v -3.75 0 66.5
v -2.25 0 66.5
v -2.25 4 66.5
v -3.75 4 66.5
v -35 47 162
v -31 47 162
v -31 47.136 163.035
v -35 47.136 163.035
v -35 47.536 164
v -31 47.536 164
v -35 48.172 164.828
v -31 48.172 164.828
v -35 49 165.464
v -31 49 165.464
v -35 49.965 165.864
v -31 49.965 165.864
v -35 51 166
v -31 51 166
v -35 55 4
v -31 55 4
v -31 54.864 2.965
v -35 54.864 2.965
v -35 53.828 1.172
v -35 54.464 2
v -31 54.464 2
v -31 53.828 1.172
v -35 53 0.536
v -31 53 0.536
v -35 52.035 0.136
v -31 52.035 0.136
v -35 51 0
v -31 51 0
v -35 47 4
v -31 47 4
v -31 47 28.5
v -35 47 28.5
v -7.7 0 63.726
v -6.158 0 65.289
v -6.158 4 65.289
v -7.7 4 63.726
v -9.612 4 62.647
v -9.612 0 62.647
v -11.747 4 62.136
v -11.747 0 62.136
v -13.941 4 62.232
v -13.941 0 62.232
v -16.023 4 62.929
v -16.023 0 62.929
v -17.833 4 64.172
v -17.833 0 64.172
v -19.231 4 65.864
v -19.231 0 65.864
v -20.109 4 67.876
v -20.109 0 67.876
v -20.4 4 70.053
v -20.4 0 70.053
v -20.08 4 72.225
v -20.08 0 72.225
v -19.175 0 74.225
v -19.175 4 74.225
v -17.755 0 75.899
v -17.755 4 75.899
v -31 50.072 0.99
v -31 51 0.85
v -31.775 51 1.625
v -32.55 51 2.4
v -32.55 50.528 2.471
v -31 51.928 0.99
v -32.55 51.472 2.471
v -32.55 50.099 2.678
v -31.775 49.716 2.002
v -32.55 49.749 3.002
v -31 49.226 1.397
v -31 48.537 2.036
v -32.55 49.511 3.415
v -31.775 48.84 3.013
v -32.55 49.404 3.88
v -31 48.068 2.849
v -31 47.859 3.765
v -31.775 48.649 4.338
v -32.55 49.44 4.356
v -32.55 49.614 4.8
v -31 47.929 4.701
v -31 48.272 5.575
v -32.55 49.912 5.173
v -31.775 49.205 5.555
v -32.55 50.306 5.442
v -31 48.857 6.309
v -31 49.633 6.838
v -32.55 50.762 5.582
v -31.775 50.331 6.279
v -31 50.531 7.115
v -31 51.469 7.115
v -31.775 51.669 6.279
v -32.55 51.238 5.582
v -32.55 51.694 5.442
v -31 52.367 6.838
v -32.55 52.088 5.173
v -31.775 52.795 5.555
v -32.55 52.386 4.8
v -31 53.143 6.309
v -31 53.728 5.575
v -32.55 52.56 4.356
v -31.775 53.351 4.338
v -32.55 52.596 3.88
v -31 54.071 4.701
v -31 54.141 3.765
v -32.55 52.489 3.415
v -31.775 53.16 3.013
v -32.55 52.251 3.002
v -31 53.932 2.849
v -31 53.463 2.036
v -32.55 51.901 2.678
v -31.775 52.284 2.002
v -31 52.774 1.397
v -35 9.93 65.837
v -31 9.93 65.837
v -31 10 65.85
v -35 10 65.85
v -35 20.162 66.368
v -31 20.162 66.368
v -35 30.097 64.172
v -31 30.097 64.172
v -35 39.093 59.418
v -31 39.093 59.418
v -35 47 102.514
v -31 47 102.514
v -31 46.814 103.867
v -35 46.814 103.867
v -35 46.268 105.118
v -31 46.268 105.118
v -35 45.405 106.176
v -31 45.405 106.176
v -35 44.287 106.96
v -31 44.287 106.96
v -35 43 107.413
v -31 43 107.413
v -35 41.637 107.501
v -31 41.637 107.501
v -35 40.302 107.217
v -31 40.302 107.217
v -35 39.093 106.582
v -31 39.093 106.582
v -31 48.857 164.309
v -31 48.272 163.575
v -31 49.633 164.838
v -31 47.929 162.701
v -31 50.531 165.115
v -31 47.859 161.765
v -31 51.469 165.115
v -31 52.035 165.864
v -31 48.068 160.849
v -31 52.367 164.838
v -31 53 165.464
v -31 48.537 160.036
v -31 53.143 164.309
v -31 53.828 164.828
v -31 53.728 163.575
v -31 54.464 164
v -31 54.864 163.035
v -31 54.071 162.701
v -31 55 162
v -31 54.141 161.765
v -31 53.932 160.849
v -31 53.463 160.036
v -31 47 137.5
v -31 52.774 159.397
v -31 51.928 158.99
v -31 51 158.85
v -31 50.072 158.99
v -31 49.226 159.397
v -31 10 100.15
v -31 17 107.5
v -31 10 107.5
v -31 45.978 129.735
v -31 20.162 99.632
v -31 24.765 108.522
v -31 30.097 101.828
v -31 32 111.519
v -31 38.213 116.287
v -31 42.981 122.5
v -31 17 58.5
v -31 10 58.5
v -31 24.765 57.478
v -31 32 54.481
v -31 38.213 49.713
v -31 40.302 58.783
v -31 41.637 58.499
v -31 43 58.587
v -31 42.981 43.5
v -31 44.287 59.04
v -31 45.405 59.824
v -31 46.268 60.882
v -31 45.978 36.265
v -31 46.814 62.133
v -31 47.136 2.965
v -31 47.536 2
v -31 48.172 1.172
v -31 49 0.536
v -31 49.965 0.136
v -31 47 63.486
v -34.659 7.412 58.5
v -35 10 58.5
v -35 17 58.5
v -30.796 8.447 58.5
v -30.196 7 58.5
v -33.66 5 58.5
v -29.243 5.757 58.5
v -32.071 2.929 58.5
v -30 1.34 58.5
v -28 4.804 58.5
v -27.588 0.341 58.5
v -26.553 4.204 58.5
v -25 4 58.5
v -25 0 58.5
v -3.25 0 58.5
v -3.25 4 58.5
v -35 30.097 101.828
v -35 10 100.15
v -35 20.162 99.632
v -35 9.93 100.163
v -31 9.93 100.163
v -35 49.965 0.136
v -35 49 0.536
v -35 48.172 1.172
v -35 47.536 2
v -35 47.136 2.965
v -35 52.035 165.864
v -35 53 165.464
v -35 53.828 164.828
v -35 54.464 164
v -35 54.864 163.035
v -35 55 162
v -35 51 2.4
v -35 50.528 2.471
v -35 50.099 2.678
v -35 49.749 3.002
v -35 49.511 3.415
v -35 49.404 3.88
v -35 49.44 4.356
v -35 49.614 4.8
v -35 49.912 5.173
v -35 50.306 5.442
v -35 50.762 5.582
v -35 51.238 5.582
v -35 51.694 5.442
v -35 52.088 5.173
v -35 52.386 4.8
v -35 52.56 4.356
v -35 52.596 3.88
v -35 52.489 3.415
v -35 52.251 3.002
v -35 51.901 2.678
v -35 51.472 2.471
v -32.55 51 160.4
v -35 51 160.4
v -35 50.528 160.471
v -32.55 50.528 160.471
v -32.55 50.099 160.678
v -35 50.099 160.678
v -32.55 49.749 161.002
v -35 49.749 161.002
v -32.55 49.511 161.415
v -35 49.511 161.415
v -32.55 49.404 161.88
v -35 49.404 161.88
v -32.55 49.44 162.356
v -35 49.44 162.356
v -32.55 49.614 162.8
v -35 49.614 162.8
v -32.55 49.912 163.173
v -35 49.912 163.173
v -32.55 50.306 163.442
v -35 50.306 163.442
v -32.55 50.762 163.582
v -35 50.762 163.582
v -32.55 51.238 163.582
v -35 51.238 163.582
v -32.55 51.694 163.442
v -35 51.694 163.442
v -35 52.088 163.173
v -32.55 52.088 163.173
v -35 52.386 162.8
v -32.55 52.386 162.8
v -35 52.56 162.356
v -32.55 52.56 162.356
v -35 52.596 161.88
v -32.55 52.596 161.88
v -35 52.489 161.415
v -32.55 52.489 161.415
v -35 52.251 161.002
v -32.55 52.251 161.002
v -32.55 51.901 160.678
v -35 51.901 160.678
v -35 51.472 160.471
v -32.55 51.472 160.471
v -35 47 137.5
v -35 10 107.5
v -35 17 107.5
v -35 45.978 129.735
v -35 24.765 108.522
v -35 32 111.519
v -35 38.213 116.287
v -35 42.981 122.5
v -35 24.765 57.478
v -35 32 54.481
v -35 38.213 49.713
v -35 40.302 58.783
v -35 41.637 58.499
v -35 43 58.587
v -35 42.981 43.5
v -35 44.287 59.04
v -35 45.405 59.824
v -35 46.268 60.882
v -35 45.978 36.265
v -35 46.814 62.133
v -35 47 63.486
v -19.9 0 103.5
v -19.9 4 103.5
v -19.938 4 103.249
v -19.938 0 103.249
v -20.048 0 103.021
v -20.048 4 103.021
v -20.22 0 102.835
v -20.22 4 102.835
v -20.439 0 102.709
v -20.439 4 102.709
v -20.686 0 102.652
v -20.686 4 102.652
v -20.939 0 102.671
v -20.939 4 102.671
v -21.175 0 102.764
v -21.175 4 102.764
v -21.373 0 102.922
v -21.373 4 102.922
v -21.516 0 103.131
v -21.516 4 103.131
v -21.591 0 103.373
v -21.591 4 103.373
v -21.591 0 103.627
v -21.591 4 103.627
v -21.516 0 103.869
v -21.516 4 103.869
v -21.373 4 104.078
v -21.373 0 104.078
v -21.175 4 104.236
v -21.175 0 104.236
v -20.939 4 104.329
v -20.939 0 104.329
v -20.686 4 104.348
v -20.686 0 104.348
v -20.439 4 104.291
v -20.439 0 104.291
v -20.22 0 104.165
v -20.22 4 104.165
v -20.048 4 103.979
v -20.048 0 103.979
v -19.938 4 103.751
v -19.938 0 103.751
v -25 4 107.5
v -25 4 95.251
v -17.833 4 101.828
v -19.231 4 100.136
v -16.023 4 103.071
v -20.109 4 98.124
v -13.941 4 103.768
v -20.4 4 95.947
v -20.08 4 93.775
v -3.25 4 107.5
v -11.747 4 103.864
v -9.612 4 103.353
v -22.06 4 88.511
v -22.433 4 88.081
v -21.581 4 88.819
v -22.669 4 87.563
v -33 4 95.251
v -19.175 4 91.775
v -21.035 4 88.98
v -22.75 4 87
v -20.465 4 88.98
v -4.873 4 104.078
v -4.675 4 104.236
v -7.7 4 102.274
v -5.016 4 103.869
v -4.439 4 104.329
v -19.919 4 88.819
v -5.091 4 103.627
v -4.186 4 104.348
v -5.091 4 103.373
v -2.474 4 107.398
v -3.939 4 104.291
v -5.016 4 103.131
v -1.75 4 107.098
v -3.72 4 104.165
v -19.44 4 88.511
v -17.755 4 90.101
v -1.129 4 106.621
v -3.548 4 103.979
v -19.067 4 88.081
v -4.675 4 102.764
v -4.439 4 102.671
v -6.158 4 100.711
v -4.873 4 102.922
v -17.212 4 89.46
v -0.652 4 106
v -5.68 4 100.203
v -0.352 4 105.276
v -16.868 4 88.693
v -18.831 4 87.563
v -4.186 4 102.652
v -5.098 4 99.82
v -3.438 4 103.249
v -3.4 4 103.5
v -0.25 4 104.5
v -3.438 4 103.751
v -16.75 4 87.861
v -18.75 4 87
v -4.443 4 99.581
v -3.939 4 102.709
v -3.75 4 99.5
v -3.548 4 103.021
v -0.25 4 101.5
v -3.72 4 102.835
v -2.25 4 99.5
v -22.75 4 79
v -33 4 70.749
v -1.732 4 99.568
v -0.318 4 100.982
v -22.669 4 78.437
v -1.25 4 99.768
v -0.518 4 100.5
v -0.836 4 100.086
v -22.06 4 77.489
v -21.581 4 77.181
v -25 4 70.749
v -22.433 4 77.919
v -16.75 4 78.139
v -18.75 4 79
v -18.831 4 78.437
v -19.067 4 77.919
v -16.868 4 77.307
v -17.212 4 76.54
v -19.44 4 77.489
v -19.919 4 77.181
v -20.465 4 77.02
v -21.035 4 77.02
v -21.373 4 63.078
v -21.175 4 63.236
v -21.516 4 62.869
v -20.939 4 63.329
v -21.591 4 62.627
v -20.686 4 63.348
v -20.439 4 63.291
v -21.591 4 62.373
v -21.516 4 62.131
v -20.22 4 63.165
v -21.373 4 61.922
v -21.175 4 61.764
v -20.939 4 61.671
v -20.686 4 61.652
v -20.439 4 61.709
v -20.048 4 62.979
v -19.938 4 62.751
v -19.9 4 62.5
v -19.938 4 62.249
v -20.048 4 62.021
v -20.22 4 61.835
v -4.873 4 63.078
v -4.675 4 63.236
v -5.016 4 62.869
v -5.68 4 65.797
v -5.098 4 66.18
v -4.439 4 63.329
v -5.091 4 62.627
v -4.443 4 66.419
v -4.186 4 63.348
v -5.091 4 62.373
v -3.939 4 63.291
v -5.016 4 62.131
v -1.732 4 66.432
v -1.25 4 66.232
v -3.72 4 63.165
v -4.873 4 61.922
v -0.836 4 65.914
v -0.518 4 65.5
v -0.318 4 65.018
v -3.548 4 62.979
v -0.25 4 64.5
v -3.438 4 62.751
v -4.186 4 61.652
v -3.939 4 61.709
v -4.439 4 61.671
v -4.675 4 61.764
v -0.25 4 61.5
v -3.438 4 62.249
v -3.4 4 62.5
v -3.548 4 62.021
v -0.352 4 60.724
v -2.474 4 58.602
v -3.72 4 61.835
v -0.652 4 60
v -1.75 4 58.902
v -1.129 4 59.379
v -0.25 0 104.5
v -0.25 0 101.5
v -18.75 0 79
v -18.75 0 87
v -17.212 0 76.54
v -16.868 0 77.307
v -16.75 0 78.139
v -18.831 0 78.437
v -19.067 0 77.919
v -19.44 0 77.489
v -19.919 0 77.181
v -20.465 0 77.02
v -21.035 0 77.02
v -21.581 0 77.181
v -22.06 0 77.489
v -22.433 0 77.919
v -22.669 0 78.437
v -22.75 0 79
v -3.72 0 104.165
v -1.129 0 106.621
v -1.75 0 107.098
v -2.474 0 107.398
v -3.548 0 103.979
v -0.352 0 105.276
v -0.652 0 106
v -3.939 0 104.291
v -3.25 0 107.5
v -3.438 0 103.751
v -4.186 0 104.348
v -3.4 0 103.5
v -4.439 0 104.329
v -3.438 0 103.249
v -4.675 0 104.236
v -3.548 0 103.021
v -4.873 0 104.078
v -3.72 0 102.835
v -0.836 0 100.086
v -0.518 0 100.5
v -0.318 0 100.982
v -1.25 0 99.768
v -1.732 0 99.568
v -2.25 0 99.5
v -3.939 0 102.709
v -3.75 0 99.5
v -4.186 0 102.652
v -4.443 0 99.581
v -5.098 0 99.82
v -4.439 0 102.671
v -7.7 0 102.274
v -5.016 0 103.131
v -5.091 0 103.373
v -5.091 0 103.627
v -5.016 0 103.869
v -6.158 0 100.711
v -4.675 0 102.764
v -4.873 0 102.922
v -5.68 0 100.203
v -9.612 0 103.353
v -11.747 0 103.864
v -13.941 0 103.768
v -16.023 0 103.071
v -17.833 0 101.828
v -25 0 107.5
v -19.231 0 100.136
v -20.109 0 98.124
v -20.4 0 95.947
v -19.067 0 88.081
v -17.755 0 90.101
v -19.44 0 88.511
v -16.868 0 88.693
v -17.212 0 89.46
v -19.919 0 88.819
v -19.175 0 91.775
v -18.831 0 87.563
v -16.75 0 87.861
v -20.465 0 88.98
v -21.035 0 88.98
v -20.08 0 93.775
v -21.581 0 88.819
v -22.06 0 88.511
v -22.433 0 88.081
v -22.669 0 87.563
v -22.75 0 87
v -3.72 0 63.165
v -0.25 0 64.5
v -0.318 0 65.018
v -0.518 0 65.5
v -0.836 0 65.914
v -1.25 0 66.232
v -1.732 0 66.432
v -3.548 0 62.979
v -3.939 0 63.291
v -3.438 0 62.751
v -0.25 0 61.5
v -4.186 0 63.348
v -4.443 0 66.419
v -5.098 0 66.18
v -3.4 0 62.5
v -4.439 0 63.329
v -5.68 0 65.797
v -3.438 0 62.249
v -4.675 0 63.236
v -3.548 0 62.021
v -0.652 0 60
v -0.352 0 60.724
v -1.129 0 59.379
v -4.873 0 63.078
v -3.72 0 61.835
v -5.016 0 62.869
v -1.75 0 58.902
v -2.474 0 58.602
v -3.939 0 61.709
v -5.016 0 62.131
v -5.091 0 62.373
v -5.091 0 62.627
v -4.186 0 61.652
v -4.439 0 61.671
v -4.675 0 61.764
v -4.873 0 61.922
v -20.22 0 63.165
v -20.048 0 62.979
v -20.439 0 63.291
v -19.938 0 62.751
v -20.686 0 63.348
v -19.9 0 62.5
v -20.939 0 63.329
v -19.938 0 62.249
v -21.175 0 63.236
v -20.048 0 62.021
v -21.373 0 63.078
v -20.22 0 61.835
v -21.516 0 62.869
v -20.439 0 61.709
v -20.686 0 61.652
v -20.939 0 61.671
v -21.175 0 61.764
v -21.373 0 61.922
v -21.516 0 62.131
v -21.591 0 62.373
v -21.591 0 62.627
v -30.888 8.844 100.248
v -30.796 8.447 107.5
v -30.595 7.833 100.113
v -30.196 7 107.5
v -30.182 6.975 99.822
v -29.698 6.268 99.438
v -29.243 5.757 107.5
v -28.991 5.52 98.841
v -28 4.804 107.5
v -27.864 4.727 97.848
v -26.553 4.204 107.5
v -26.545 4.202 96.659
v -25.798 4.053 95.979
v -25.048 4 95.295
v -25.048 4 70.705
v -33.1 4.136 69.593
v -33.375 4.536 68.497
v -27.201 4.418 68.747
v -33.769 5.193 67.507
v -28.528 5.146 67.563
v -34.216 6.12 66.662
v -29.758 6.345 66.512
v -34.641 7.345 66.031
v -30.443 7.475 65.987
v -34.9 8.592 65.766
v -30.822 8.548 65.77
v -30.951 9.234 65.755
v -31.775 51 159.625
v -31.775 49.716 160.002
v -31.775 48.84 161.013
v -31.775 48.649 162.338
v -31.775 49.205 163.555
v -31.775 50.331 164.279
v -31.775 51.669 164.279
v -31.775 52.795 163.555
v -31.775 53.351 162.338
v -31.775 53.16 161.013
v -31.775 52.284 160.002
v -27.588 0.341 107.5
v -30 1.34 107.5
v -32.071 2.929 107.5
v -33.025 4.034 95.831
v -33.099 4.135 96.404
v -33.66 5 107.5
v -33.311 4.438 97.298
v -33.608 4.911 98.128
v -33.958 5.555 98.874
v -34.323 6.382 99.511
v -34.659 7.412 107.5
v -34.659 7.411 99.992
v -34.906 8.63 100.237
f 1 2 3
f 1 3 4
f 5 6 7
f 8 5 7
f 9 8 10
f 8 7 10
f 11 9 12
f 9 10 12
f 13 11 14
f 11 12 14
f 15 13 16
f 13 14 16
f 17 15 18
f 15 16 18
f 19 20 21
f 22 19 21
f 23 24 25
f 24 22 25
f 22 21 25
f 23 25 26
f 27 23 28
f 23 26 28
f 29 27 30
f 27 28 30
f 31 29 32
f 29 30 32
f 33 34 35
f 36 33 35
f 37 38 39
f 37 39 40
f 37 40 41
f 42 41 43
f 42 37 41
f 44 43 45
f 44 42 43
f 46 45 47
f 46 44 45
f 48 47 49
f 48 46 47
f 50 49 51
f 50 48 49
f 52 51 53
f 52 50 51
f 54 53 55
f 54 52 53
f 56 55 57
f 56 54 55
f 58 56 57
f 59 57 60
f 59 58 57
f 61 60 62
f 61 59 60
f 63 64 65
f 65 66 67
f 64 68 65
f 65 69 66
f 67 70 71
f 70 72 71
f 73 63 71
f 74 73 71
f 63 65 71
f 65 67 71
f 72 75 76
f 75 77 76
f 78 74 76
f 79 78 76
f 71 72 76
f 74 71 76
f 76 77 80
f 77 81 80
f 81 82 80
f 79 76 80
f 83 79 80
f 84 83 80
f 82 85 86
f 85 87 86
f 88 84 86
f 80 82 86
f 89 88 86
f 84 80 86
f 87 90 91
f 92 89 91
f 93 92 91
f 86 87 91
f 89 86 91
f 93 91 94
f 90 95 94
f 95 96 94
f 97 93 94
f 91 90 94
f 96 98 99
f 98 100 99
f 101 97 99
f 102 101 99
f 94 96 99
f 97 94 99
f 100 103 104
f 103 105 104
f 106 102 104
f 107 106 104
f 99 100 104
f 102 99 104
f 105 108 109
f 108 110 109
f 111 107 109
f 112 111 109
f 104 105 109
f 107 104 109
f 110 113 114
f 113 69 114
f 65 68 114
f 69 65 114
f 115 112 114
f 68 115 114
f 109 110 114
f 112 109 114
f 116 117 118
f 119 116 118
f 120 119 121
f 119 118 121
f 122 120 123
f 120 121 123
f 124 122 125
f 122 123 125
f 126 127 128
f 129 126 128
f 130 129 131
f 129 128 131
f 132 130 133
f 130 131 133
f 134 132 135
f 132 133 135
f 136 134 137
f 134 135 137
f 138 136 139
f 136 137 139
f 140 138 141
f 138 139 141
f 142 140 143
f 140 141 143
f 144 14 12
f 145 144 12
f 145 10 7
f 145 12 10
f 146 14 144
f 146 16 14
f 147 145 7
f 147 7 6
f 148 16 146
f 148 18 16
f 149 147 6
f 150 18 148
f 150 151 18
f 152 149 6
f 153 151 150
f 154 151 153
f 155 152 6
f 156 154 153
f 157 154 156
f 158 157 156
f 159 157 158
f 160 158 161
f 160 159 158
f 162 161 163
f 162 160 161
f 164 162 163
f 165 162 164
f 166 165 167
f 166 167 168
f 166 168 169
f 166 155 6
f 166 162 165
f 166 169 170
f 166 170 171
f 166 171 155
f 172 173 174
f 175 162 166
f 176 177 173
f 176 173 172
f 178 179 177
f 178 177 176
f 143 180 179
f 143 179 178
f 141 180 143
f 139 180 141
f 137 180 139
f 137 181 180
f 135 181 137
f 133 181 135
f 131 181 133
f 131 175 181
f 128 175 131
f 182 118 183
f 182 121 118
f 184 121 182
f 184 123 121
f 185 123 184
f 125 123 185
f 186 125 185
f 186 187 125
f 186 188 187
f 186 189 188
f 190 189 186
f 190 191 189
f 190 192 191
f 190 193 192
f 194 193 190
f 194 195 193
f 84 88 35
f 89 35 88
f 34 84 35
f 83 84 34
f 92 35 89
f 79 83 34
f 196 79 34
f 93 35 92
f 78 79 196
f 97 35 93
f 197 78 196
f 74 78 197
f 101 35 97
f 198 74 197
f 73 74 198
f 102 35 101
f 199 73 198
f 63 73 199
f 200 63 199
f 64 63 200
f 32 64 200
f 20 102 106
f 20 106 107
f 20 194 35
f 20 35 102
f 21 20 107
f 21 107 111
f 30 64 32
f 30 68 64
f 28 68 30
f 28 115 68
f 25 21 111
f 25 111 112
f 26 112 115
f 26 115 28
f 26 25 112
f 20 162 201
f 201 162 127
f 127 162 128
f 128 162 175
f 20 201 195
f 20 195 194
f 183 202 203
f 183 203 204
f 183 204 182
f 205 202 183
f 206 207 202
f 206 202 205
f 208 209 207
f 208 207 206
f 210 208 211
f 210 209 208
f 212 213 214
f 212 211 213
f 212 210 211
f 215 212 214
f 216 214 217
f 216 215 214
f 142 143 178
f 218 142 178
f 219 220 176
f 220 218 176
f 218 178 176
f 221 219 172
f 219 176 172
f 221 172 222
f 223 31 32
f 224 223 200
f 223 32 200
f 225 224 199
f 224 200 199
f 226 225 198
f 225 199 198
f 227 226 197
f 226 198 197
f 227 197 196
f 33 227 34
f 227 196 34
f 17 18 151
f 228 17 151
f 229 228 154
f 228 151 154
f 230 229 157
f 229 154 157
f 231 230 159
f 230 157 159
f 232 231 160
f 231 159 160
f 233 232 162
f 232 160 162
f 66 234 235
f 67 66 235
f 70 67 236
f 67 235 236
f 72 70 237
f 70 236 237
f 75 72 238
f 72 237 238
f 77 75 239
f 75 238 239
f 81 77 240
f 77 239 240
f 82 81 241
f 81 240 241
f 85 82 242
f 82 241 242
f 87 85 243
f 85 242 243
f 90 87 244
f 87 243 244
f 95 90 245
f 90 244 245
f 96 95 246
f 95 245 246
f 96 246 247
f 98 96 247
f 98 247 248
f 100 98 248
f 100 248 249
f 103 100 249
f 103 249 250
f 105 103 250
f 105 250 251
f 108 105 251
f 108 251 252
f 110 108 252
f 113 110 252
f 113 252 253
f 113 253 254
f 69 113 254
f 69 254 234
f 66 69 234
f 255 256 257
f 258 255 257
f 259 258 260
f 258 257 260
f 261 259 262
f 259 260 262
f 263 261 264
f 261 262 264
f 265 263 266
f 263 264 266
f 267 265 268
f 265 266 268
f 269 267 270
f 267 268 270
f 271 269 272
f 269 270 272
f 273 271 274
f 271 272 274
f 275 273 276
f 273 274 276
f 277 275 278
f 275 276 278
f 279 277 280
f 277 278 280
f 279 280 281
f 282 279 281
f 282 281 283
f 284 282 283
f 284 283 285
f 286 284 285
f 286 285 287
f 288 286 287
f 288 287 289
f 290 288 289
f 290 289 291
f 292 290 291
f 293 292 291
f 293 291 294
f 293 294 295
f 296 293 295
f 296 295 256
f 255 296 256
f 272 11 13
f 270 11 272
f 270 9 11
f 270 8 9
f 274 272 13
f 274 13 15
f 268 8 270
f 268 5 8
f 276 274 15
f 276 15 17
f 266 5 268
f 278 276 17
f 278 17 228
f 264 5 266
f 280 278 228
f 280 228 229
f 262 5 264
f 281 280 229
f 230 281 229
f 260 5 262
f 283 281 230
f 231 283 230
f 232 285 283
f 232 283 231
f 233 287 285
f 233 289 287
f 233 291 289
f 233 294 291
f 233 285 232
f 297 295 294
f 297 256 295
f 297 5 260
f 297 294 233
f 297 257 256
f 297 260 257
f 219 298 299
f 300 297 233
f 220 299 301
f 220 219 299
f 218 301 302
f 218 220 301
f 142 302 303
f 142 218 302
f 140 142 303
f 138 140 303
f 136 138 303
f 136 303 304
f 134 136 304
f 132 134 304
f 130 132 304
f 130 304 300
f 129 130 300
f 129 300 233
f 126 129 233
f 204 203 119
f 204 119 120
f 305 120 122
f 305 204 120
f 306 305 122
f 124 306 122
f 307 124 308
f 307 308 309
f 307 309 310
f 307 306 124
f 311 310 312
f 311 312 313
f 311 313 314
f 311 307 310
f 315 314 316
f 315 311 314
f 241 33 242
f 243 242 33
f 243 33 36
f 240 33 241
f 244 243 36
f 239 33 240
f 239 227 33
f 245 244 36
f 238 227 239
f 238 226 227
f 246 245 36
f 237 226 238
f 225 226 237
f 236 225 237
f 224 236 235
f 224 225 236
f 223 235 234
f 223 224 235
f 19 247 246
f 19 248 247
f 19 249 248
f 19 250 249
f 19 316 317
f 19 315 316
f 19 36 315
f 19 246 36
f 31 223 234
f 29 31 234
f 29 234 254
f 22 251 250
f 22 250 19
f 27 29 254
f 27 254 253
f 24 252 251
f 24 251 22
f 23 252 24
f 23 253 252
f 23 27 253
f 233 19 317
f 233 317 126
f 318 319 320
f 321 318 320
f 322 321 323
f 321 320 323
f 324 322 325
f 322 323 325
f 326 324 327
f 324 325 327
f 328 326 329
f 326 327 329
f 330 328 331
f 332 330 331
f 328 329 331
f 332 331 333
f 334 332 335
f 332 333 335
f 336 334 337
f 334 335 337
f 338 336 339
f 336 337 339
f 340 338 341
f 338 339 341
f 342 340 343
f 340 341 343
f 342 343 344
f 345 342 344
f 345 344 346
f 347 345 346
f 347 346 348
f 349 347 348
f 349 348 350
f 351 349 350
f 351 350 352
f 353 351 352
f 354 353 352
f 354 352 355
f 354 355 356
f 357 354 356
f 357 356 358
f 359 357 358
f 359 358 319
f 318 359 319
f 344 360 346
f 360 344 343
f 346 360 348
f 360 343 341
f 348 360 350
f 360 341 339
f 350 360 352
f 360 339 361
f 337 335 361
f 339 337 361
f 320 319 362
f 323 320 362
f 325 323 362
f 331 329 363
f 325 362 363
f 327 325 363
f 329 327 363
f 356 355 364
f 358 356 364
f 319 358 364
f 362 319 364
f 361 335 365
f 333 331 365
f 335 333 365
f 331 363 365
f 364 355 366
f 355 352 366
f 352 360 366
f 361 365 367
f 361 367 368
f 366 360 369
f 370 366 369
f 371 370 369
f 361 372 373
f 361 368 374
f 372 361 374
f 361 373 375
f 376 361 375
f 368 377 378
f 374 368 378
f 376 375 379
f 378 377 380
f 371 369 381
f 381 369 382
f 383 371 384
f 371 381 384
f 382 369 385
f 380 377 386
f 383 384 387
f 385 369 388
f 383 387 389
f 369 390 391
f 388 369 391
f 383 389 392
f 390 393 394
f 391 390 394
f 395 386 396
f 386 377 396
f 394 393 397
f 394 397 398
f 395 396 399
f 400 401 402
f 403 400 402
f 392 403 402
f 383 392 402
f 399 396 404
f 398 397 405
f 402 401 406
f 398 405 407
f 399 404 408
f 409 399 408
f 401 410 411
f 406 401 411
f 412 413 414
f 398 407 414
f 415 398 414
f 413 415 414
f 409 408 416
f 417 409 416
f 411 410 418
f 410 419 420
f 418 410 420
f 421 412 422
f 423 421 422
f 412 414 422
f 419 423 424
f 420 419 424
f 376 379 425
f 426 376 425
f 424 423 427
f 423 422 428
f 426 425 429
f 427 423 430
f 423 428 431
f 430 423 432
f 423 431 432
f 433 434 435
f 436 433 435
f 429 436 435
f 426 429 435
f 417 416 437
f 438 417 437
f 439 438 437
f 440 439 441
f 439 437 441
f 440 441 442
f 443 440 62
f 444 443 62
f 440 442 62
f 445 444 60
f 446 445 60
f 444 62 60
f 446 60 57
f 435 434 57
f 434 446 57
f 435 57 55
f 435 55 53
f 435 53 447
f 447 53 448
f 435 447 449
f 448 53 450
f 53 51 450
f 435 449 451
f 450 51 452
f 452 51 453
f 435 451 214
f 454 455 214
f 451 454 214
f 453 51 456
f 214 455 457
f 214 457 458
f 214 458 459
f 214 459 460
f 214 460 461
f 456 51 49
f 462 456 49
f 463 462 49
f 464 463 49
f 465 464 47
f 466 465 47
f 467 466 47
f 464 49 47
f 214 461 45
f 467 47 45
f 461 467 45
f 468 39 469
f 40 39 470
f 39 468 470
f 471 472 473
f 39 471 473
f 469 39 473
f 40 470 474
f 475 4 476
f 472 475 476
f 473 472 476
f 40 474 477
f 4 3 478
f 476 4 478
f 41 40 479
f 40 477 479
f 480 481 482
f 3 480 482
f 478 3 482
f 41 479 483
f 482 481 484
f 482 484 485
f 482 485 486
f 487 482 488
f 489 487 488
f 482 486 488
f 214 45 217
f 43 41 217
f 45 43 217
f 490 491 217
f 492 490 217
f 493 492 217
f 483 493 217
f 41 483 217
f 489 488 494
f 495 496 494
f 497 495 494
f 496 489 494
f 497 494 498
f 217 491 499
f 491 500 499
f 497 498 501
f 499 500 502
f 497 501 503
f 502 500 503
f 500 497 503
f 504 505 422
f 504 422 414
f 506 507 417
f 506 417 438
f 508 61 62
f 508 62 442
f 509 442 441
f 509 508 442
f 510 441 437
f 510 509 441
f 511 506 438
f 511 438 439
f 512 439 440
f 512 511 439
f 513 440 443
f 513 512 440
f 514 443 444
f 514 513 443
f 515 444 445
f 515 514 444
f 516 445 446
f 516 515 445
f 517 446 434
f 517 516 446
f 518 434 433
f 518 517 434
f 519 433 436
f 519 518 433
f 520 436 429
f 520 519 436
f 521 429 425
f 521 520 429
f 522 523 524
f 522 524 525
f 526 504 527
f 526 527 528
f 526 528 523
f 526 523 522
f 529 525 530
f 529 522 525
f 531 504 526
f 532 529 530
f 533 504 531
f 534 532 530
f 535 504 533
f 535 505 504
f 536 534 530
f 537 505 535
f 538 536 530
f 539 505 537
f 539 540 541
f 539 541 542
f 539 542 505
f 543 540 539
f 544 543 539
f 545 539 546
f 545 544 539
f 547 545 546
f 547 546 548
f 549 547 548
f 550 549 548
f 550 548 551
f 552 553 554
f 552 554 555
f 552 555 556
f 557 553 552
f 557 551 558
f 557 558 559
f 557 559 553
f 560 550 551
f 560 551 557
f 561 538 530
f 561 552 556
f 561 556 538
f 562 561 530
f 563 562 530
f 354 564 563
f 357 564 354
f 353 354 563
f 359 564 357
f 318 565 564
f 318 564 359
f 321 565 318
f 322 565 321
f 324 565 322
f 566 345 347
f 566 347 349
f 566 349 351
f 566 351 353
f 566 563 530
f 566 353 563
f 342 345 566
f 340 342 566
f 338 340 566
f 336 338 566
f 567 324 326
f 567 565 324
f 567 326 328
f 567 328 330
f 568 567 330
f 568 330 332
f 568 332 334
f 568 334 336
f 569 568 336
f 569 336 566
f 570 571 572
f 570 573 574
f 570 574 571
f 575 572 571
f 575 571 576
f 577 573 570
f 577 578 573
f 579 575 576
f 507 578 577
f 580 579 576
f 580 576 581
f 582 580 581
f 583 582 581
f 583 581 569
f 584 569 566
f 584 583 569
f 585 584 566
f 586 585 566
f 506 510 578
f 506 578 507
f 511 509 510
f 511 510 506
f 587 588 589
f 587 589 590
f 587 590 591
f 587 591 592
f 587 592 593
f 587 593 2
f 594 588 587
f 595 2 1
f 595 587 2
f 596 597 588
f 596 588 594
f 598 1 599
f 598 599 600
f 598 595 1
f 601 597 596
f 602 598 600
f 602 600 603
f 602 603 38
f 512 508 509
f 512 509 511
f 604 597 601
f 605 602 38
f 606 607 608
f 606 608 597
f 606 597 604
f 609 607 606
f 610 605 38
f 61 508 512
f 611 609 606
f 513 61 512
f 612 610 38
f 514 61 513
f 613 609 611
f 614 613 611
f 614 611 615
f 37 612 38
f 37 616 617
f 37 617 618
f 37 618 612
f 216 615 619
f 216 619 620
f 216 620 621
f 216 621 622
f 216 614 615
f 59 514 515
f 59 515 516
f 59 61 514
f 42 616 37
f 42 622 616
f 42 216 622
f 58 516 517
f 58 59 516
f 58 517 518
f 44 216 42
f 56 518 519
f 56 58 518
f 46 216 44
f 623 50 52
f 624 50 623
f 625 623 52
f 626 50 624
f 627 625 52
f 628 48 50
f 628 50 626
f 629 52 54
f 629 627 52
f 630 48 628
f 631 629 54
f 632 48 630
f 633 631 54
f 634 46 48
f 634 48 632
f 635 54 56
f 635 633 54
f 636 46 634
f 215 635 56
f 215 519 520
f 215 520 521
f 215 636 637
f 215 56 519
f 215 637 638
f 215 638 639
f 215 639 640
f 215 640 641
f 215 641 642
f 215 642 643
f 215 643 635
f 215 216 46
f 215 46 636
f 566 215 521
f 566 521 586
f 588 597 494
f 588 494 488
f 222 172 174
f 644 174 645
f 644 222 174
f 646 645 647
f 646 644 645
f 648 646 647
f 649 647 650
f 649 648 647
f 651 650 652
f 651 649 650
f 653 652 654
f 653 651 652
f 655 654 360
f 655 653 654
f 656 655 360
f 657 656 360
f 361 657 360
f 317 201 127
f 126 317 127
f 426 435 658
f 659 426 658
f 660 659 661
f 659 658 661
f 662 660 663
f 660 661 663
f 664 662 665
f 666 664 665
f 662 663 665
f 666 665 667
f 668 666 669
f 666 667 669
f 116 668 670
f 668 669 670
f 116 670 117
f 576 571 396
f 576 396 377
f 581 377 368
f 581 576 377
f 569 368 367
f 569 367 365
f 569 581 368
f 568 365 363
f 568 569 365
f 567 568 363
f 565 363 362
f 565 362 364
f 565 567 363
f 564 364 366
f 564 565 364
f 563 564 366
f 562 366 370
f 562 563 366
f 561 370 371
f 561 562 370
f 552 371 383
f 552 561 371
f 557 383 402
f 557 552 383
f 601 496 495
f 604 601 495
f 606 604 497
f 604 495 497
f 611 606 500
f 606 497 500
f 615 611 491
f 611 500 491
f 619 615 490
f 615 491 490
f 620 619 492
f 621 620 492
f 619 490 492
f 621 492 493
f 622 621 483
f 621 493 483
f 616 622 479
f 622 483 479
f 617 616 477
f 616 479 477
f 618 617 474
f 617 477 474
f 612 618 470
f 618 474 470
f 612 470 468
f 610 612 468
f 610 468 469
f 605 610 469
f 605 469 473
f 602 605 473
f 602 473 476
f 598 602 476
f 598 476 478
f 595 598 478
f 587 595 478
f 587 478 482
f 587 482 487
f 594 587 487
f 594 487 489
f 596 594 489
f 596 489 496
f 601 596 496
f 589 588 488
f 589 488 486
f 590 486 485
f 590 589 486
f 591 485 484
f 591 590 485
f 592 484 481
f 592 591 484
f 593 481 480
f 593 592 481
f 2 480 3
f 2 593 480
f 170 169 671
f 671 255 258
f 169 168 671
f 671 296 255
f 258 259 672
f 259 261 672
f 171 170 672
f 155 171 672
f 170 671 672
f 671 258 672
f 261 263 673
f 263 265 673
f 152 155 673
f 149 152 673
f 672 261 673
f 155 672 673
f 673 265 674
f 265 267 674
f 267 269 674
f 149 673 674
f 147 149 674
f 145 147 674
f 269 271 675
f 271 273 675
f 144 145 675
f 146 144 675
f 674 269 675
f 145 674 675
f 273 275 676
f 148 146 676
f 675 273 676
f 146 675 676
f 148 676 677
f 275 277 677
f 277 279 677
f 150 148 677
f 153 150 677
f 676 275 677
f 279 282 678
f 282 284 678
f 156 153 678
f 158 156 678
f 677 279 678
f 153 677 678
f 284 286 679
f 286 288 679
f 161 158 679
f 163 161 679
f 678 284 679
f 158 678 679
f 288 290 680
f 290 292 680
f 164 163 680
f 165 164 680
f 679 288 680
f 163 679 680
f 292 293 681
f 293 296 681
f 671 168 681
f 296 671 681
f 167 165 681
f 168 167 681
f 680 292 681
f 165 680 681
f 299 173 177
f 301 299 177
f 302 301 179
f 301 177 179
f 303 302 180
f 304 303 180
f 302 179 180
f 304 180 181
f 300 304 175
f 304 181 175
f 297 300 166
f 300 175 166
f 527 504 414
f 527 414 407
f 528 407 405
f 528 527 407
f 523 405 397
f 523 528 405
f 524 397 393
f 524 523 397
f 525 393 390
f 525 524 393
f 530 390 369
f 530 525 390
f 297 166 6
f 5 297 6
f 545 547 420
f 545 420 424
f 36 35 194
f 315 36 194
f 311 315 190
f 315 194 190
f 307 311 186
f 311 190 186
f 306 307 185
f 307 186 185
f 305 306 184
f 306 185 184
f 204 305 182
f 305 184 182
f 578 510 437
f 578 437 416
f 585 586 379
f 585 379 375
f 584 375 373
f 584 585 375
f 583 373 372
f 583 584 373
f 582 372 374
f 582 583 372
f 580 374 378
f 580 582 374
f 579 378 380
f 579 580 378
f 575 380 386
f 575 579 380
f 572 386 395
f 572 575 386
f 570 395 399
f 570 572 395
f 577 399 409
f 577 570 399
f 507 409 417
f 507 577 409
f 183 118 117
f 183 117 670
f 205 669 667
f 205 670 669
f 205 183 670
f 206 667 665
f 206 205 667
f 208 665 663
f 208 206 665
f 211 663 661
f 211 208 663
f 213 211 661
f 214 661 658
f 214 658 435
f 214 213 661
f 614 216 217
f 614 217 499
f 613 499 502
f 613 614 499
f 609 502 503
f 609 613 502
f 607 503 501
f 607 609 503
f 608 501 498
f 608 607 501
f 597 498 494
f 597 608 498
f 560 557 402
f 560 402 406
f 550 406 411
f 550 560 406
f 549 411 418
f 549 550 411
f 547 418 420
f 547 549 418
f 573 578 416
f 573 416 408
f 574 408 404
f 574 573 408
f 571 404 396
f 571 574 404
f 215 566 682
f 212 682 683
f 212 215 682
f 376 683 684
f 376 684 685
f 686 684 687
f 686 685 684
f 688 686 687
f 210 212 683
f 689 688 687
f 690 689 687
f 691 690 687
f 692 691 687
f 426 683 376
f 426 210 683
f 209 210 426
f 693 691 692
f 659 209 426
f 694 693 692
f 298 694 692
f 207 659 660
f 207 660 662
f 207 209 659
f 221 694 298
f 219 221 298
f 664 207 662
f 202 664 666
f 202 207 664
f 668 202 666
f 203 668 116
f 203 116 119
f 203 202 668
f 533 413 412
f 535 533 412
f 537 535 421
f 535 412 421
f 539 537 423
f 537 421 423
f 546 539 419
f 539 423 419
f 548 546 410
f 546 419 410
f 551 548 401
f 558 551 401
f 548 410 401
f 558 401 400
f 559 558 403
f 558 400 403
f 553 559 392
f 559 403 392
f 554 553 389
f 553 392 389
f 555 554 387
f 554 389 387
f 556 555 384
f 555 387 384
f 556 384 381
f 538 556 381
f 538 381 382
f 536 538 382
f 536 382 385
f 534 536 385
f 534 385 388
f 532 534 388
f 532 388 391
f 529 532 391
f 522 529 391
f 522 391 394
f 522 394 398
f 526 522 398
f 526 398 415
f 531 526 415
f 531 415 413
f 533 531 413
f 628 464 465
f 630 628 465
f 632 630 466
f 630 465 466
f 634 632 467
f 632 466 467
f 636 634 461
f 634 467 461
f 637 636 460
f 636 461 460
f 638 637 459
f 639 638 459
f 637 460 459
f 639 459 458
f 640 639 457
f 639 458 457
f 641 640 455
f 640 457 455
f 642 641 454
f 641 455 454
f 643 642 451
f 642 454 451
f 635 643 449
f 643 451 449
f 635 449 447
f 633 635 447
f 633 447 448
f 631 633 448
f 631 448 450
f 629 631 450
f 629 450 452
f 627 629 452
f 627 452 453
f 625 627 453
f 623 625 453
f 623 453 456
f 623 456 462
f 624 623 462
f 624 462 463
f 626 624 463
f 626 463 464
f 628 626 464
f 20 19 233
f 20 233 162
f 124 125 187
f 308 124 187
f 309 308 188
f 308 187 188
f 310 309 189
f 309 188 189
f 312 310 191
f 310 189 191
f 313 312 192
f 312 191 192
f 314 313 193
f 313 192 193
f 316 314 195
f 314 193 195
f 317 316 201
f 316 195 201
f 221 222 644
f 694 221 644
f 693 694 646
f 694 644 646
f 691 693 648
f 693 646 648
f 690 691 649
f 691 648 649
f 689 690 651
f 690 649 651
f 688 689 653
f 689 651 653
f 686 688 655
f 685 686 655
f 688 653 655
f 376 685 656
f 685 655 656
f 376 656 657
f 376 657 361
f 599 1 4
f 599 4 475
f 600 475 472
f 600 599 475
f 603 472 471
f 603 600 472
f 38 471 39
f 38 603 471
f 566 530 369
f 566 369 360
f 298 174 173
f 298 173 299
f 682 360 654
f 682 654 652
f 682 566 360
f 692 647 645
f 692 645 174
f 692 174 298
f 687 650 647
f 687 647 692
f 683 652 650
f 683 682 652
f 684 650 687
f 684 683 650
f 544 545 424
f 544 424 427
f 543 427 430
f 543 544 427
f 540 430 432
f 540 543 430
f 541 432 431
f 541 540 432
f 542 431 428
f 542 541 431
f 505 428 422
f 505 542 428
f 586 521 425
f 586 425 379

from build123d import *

# Parameters (mm, degrees)
BOSS_EXTRU_1_DEPTH                             = 166
FRAISAGE_POUR_VIS_T_TE_FRAIS_E_M31_D           = 3.2
FRAISAGE_POUR_VIS_T_TE_FRAIS_E_M31_DEPTH       = 4
FRAISAGE_POUR_VIS_T_TE_FRAIS_E_M31_CSINK_D     = 6.3
FRAISAGE_POUR_VIS_T_TE_FRAIS_E_M31_CSINK_ANGLE = 90
D_GAGEMENT_M1_61_D                             = 1.7
D_GAGEMENT_M1_61_DEPTH                         = 4
ENL_V_MAT_EXTRU_1_DEPTH                        = 4
ENL_V_MAT_EXTRU_2_DEPTH                        = 31.75
ENL_V_MAT_EXTRU_2_DEPTH_BACK                   = 5


with BuildPart() as part:
    # Esquisse1 → Boss.-Extru.1 (new body)
    with BuildSketch(Plane.XY):
        with BuildLine():
            Line((0, 0), (-25, 0))
            ThreePointArc((-25, 0), (-32.071067812, 2.928932188), (-35, 10))
            Line((-35, 10), (-35, 55))
            Line((-35, 55), (-31, 55))
            Line((-31, 55), (-31, 10))
            ThreePointArc((-31, 10), (-29.242640687, 5.757359313), (-25, 4))
            Line((-25, 4), (0, 4))
            Line((0, 4), (0, 0))
        make_face()
    extrude(amount=BOSS_EXTRU_1_DEPTH)

    # Fraisage pour vis à tête fraisée M31
    with Locations(Plane(origin=(-31, 0, 0), x_dir=(0, 0, 1), z_dir=(1, 0, 0))):
        with Locations((4, -51), (162, -51)):
            CounterSinkHole(FRAISAGE_POUR_VIS_T_TE_FRAIS_E_M31_D / 2, FRAISAGE_POUR_VIS_T_TE_FRAIS_E_M31_CSINK_D / 2, depth=FRAISAGE_POUR_VIS_T_TE_FRAIS_E_M31_DEPTH, counter_sink_angle=FRAISAGE_POUR_VIS_T_TE_FRAIS_E_M31_CSINK_ANGLE)

    # Dégagement M1.61
    with Locations(Plane(origin=(0, 0, 0), x_dir=(-1, 0, 0), z_dir=(0, -1, 0))):
        with Locations((20.75, -62.5), (20.75, -103.5), (4.25, -103.5), (4.25, -62.5)):
            Hole(D_GAGEMENT_M1_61_D / 2, depth=D_GAGEMENT_M1_61_DEPTH)

    # Esquisse6 → Enlèv. mat.-Extru.1 (cut)
    with BuildSketch(Plane.XZ):
        with BuildLine():
            Line((-35, 58.5), (-3.25, 58.5))
            ThreePointArc((-3.25, 58.5), (-1.128679656, 59.378679656), (-0.25, 61.5))
            Line((-0.25, 61.5), (-0.25, 64.5))
            ThreePointArc((-0.25, 64.5), (-0.835786438, 65.914213562), (-2.25, 66.5))
            Line((-2.25, 66.5), (-3.750142858, 66.5))
            ThreePointArc((-3.750142858, 66.5), (-5.097923909, 66.180202649), (-6.15836042, 65.288990826))
            ThreePointArc((-6.15836042, 65.288990826), (-17.832822404, 64.171534919), (-17.754587156, 75.899094322))
            ThreePointArc((-17.754587156, 75.899094322), (-17.012643745, 76.911706018), (-16.75, 78.139256723))
            Line((-16.75, 78.139256723), (-16.75, 87.860743277))
            ThreePointArc((-16.75, 87.860743277), (-17.012643745, 89.088293982), (-17.754587156, 90.100905678))
            ThreePointArc((-17.754587156, 90.100905678), (-17.832822404, 101.828465081), (-6.15836042, 100.711009174))
            ThreePointArc((-6.15836042, 100.711009174), (-5.097923909, 99.819797351), (-3.750142858, 99.5))
            Line((-3.750142858, 99.5), (-2.25, 99.5))
            ThreePointArc((-2.25, 99.5), (-0.835786438, 100.085786438), (-0.25, 101.5))
            Line((-0.25, 101.5), (-0.25, 104.5))
            ThreePointArc((-0.25, 104.5), (-1.128679656, 106.621320344), (-3.25, 107.5))
            Line((-3.25, 107.5), (-35, 107.5))
            Line((-35, 107.5), (-35, 166))
            Line((-35, 166), (0, 166))
            Line((0, 166), (0, 0))
            Line((0, 0), (-35, 0))
            Line((-35, 0), (-35, 58.5))
        make_face()
        with BuildLine():
            Line((-18.75, 87), (-18.75, 79))
            ThreePointArc((-18.75, 79), (-20.75, 77), (-22.75, 79))
            Line((-22.75, 79), (-22.75, 87))
            ThreePointArc((-22.75, 87), (-20.75, 89), (-18.75, 87))
        make_face()
    extrude(amount=-ENL_V_MAT_EXTRU_1_DEPTH, mode=Mode.SUBTRACT)

    # Esquisse7 → Enlèv. mat.-Extru.2 (cut, two sides)
    with BuildSketch(Plane(origin=(-31, 0, 0), x_dir=(0, 0, -1), z_dir=(1, 0, 0))) as enl_v_mat_extru_2_sk:
        with BuildLine():
            ThreePointArc((-4, 55), (-1.171572875, 53.828427125), (0, 51))
            Line((0, 51), (0, 55))
            Line((0, 55), (-4, 55))
        make_face()
        with BuildLine():
            Line((0, 4), (0, 51))
            ThreePointArc((0, 51), (-1.171572875, 48.171572875), (-4, 47))
            Line((-4, 47), (-28.5, 47))
            ThreePointArc((-28.5, 47), (-49.713203436, 38.213203436), (-58.5, 17))
            Line((-58.5, 17), (-58.5, 4))
            Line((-58.5, 4), (0, 4))
        make_face()
        with BuildLine():
            ThreePointArc((-162, 47), (-164.828427125, 48.171572875), (-166, 51))
            Line((-166, 51), (-166, 4))
            Line((-166, 4), (-107.5, 4))
            Line((-107.5, 4), (-107.5, 17))
            ThreePointArc((-107.5, 17), (-116.286796564, 38.213203436), (-137.5, 47))
            Line((-137.5, 47), (-162, 47))
        make_face()
        with BuildLine():
            Line((-166, 55), (-166, 51))
            ThreePointArc((-166, 51), (-164.828427125, 53.828427125), (-162, 55))
            Line((-162, 55), (-166, 55))
        make_face()
        with BuildLine():
            Line((-63.485711369, 47), (-102.514288631, 47))
            ThreePointArc((-102.514288631, 47), (-106.960347769, 44.287478555), (-106.582394604, 39.093023256))
            ThreePointArc((-106.582394604, 39.093023256), (-100.388347981, 25.168554611), (-100.163444343, 9.930232558))
            ThreePointArc((-100.163444343, 9.930232558), (-99.101139812, 5.810263552), (-95.250739651, 4))
            Line((-95.250739651, 4), (-70.749260349, 4))
            ThreePointArc((-70.749260349, 4), (-66.898860188, 5.810263552), (-65.836555657, 9.930232558))
            ThreePointArc((-65.836555657, 9.930232558), (-65.611652019, 25.168554611), (-59.417605396, 39.093023256))
            ThreePointArc((-59.417605396, 39.093023256), (-59.039652231, 44.287478555), (-63.485711369, 47))
        make_face()
    extrude(amount=ENL_V_MAT_EXTRU_2_DEPTH, mode=Mode.SUBTRACT)
    extrude(enl_v_mat_extru_2_sk.sketch, amount=-ENL_V_MAT_EXTRU_2_DEPTH_BACK, mode=Mode.SUBTRACT)


solid = part.part
